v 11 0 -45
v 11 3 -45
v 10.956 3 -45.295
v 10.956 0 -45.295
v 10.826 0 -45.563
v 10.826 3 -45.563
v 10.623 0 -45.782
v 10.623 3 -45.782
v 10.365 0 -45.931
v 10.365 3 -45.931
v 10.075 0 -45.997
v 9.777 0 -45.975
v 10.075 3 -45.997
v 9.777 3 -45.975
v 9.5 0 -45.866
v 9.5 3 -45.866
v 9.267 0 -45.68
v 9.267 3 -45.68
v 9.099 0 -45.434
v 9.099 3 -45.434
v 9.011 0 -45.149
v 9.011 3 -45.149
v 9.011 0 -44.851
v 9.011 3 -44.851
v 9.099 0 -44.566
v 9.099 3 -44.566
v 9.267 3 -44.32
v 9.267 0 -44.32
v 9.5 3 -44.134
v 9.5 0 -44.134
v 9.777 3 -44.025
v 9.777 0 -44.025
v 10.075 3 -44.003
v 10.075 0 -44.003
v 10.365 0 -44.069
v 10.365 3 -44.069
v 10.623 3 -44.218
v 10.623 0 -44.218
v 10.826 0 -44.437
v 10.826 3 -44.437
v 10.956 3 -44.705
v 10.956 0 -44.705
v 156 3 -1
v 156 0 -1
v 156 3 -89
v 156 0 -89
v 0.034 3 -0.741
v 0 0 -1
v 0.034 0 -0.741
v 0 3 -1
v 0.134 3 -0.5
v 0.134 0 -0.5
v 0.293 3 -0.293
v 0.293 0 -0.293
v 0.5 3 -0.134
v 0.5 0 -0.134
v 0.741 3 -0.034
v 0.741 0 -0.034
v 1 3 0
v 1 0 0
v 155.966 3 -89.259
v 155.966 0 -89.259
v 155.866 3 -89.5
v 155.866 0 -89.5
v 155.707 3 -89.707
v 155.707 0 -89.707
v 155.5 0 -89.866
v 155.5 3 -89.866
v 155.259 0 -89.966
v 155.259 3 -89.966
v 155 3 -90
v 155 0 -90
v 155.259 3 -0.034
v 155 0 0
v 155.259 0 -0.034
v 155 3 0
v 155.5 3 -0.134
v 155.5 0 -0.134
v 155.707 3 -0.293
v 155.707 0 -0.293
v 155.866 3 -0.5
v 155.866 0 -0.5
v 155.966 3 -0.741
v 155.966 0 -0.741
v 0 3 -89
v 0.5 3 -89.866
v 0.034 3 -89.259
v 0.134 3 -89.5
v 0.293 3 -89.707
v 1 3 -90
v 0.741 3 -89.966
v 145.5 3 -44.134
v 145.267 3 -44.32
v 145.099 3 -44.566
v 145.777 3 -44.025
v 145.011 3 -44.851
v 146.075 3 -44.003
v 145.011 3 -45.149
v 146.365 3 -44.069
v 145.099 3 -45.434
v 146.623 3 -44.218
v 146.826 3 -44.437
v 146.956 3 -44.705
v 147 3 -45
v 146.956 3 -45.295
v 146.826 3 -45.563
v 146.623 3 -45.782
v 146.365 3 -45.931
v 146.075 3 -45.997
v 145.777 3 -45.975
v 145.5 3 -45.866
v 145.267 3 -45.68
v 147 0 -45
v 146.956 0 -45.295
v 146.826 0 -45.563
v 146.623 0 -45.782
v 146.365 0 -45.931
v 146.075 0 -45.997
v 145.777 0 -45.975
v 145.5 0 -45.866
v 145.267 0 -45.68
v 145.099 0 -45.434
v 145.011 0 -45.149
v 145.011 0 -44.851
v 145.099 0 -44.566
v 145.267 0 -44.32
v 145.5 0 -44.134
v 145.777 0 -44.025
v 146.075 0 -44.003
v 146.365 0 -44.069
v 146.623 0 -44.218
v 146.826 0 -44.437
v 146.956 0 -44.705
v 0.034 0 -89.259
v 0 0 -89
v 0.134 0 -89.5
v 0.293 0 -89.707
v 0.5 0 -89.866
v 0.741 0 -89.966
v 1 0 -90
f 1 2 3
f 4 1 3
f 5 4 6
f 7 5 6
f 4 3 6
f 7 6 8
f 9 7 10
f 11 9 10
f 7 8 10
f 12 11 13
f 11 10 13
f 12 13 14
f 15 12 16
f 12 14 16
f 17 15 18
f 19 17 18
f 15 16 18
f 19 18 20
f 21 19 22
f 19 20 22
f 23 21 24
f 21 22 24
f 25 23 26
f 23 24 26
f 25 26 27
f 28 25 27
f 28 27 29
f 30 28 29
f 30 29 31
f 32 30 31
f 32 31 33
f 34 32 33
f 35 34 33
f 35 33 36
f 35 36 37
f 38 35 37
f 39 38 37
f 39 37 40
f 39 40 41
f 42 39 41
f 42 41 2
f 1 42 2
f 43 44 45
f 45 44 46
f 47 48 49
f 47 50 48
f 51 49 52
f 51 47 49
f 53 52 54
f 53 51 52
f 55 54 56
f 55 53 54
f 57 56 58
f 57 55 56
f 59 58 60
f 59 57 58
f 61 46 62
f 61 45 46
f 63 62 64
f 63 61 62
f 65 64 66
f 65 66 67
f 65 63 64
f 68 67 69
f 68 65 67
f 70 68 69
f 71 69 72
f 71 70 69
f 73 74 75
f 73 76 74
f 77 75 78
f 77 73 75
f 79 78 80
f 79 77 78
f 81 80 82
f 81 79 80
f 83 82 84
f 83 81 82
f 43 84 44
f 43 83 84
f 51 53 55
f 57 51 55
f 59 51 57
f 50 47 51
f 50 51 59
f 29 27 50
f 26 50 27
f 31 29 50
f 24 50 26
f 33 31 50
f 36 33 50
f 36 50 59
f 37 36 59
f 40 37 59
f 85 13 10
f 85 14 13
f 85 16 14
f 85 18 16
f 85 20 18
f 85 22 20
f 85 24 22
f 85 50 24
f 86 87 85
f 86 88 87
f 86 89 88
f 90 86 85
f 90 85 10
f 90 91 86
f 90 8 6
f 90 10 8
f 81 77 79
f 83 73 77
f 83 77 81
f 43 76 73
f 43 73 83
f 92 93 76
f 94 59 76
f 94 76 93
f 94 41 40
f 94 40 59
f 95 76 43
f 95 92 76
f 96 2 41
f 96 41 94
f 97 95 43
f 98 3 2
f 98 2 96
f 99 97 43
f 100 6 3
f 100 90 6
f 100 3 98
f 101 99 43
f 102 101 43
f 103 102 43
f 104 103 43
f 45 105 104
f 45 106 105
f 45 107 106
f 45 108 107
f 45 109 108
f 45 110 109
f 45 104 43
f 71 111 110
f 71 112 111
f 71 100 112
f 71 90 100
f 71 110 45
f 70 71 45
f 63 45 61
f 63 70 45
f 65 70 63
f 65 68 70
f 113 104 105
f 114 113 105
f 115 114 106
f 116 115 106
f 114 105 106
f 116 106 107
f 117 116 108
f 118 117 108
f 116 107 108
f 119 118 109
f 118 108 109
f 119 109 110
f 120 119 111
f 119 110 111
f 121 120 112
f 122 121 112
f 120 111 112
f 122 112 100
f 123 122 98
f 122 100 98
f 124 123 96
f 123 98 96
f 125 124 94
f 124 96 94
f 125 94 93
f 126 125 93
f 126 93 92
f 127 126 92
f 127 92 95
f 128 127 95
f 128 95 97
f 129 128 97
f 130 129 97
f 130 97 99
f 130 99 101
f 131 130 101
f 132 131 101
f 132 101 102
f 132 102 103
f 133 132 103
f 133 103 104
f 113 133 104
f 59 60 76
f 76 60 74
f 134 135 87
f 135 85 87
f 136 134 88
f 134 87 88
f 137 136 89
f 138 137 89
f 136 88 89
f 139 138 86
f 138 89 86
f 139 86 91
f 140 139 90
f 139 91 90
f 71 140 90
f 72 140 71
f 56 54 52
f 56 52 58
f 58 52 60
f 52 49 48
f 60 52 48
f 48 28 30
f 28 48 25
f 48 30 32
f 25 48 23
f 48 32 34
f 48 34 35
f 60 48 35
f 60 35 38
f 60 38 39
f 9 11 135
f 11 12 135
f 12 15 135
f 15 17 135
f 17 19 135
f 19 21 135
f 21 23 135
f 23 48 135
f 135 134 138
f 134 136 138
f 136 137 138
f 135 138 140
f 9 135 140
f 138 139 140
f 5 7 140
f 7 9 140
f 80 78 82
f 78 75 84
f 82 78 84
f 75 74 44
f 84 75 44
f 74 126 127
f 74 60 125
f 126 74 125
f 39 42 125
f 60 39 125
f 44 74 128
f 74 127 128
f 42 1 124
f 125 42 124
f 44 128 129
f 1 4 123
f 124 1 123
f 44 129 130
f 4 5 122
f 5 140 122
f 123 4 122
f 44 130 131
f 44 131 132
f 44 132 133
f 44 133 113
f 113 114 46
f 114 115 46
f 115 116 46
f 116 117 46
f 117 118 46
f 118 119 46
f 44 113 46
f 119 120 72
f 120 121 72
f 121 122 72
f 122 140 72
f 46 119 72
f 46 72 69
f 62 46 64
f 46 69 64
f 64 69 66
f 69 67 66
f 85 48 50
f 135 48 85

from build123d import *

# Parameters (mm, degrees)
SKETCH1_W           = 156
SKETCH1_H           = 90
BOSS_EXTRUDE1_DEPTH = 3
FILLET1_R           = 1
SKETCH2_R           = 1
CUT_EXTRUDE1_DEPTH  = 4


with BuildPart() as part:
    # Sketch1 → Boss-Extrude1 (new body)
    with BuildSketch(Plane(origin=(0, 0, 0), x_dir=(1, 0, 0), z_dir=(0, 1, 0))):
        with Locations((78, 45)):
            Rectangle(SKETCH1_W, SKETCH1_H)
    extrude(amount=BOSS_EXTRUDE1_DEPTH)

    # Fillet1
    fillet1_edges = [part.edges().sort_by_distance(p)[0] for p in [
        (0, 1.5, -90),
        (156, 1.5, -90),
        (156, 1.5, 0),
        (0, 1.5, 0),
    ]]
    fillet(fillet1_edges, radius=FILLET1_R)

    # Sketch2 → Cut-Extrude1 (cut, through all)
    with BuildSketch(Plane(origin=(0, 3, 0), x_dir=(1, 0, 0), z_dir=(0, 1, 0))):
        with Locations((146, 45)):
            Circle(SKETCH2_R)
        with Locations((10, 45)):
            Circle(SKETCH2_R)
    extrude(amount=-CUT_EXTRUDE1_DEPTH, mode=Mode.SUBTRACT)


solid = part.part
